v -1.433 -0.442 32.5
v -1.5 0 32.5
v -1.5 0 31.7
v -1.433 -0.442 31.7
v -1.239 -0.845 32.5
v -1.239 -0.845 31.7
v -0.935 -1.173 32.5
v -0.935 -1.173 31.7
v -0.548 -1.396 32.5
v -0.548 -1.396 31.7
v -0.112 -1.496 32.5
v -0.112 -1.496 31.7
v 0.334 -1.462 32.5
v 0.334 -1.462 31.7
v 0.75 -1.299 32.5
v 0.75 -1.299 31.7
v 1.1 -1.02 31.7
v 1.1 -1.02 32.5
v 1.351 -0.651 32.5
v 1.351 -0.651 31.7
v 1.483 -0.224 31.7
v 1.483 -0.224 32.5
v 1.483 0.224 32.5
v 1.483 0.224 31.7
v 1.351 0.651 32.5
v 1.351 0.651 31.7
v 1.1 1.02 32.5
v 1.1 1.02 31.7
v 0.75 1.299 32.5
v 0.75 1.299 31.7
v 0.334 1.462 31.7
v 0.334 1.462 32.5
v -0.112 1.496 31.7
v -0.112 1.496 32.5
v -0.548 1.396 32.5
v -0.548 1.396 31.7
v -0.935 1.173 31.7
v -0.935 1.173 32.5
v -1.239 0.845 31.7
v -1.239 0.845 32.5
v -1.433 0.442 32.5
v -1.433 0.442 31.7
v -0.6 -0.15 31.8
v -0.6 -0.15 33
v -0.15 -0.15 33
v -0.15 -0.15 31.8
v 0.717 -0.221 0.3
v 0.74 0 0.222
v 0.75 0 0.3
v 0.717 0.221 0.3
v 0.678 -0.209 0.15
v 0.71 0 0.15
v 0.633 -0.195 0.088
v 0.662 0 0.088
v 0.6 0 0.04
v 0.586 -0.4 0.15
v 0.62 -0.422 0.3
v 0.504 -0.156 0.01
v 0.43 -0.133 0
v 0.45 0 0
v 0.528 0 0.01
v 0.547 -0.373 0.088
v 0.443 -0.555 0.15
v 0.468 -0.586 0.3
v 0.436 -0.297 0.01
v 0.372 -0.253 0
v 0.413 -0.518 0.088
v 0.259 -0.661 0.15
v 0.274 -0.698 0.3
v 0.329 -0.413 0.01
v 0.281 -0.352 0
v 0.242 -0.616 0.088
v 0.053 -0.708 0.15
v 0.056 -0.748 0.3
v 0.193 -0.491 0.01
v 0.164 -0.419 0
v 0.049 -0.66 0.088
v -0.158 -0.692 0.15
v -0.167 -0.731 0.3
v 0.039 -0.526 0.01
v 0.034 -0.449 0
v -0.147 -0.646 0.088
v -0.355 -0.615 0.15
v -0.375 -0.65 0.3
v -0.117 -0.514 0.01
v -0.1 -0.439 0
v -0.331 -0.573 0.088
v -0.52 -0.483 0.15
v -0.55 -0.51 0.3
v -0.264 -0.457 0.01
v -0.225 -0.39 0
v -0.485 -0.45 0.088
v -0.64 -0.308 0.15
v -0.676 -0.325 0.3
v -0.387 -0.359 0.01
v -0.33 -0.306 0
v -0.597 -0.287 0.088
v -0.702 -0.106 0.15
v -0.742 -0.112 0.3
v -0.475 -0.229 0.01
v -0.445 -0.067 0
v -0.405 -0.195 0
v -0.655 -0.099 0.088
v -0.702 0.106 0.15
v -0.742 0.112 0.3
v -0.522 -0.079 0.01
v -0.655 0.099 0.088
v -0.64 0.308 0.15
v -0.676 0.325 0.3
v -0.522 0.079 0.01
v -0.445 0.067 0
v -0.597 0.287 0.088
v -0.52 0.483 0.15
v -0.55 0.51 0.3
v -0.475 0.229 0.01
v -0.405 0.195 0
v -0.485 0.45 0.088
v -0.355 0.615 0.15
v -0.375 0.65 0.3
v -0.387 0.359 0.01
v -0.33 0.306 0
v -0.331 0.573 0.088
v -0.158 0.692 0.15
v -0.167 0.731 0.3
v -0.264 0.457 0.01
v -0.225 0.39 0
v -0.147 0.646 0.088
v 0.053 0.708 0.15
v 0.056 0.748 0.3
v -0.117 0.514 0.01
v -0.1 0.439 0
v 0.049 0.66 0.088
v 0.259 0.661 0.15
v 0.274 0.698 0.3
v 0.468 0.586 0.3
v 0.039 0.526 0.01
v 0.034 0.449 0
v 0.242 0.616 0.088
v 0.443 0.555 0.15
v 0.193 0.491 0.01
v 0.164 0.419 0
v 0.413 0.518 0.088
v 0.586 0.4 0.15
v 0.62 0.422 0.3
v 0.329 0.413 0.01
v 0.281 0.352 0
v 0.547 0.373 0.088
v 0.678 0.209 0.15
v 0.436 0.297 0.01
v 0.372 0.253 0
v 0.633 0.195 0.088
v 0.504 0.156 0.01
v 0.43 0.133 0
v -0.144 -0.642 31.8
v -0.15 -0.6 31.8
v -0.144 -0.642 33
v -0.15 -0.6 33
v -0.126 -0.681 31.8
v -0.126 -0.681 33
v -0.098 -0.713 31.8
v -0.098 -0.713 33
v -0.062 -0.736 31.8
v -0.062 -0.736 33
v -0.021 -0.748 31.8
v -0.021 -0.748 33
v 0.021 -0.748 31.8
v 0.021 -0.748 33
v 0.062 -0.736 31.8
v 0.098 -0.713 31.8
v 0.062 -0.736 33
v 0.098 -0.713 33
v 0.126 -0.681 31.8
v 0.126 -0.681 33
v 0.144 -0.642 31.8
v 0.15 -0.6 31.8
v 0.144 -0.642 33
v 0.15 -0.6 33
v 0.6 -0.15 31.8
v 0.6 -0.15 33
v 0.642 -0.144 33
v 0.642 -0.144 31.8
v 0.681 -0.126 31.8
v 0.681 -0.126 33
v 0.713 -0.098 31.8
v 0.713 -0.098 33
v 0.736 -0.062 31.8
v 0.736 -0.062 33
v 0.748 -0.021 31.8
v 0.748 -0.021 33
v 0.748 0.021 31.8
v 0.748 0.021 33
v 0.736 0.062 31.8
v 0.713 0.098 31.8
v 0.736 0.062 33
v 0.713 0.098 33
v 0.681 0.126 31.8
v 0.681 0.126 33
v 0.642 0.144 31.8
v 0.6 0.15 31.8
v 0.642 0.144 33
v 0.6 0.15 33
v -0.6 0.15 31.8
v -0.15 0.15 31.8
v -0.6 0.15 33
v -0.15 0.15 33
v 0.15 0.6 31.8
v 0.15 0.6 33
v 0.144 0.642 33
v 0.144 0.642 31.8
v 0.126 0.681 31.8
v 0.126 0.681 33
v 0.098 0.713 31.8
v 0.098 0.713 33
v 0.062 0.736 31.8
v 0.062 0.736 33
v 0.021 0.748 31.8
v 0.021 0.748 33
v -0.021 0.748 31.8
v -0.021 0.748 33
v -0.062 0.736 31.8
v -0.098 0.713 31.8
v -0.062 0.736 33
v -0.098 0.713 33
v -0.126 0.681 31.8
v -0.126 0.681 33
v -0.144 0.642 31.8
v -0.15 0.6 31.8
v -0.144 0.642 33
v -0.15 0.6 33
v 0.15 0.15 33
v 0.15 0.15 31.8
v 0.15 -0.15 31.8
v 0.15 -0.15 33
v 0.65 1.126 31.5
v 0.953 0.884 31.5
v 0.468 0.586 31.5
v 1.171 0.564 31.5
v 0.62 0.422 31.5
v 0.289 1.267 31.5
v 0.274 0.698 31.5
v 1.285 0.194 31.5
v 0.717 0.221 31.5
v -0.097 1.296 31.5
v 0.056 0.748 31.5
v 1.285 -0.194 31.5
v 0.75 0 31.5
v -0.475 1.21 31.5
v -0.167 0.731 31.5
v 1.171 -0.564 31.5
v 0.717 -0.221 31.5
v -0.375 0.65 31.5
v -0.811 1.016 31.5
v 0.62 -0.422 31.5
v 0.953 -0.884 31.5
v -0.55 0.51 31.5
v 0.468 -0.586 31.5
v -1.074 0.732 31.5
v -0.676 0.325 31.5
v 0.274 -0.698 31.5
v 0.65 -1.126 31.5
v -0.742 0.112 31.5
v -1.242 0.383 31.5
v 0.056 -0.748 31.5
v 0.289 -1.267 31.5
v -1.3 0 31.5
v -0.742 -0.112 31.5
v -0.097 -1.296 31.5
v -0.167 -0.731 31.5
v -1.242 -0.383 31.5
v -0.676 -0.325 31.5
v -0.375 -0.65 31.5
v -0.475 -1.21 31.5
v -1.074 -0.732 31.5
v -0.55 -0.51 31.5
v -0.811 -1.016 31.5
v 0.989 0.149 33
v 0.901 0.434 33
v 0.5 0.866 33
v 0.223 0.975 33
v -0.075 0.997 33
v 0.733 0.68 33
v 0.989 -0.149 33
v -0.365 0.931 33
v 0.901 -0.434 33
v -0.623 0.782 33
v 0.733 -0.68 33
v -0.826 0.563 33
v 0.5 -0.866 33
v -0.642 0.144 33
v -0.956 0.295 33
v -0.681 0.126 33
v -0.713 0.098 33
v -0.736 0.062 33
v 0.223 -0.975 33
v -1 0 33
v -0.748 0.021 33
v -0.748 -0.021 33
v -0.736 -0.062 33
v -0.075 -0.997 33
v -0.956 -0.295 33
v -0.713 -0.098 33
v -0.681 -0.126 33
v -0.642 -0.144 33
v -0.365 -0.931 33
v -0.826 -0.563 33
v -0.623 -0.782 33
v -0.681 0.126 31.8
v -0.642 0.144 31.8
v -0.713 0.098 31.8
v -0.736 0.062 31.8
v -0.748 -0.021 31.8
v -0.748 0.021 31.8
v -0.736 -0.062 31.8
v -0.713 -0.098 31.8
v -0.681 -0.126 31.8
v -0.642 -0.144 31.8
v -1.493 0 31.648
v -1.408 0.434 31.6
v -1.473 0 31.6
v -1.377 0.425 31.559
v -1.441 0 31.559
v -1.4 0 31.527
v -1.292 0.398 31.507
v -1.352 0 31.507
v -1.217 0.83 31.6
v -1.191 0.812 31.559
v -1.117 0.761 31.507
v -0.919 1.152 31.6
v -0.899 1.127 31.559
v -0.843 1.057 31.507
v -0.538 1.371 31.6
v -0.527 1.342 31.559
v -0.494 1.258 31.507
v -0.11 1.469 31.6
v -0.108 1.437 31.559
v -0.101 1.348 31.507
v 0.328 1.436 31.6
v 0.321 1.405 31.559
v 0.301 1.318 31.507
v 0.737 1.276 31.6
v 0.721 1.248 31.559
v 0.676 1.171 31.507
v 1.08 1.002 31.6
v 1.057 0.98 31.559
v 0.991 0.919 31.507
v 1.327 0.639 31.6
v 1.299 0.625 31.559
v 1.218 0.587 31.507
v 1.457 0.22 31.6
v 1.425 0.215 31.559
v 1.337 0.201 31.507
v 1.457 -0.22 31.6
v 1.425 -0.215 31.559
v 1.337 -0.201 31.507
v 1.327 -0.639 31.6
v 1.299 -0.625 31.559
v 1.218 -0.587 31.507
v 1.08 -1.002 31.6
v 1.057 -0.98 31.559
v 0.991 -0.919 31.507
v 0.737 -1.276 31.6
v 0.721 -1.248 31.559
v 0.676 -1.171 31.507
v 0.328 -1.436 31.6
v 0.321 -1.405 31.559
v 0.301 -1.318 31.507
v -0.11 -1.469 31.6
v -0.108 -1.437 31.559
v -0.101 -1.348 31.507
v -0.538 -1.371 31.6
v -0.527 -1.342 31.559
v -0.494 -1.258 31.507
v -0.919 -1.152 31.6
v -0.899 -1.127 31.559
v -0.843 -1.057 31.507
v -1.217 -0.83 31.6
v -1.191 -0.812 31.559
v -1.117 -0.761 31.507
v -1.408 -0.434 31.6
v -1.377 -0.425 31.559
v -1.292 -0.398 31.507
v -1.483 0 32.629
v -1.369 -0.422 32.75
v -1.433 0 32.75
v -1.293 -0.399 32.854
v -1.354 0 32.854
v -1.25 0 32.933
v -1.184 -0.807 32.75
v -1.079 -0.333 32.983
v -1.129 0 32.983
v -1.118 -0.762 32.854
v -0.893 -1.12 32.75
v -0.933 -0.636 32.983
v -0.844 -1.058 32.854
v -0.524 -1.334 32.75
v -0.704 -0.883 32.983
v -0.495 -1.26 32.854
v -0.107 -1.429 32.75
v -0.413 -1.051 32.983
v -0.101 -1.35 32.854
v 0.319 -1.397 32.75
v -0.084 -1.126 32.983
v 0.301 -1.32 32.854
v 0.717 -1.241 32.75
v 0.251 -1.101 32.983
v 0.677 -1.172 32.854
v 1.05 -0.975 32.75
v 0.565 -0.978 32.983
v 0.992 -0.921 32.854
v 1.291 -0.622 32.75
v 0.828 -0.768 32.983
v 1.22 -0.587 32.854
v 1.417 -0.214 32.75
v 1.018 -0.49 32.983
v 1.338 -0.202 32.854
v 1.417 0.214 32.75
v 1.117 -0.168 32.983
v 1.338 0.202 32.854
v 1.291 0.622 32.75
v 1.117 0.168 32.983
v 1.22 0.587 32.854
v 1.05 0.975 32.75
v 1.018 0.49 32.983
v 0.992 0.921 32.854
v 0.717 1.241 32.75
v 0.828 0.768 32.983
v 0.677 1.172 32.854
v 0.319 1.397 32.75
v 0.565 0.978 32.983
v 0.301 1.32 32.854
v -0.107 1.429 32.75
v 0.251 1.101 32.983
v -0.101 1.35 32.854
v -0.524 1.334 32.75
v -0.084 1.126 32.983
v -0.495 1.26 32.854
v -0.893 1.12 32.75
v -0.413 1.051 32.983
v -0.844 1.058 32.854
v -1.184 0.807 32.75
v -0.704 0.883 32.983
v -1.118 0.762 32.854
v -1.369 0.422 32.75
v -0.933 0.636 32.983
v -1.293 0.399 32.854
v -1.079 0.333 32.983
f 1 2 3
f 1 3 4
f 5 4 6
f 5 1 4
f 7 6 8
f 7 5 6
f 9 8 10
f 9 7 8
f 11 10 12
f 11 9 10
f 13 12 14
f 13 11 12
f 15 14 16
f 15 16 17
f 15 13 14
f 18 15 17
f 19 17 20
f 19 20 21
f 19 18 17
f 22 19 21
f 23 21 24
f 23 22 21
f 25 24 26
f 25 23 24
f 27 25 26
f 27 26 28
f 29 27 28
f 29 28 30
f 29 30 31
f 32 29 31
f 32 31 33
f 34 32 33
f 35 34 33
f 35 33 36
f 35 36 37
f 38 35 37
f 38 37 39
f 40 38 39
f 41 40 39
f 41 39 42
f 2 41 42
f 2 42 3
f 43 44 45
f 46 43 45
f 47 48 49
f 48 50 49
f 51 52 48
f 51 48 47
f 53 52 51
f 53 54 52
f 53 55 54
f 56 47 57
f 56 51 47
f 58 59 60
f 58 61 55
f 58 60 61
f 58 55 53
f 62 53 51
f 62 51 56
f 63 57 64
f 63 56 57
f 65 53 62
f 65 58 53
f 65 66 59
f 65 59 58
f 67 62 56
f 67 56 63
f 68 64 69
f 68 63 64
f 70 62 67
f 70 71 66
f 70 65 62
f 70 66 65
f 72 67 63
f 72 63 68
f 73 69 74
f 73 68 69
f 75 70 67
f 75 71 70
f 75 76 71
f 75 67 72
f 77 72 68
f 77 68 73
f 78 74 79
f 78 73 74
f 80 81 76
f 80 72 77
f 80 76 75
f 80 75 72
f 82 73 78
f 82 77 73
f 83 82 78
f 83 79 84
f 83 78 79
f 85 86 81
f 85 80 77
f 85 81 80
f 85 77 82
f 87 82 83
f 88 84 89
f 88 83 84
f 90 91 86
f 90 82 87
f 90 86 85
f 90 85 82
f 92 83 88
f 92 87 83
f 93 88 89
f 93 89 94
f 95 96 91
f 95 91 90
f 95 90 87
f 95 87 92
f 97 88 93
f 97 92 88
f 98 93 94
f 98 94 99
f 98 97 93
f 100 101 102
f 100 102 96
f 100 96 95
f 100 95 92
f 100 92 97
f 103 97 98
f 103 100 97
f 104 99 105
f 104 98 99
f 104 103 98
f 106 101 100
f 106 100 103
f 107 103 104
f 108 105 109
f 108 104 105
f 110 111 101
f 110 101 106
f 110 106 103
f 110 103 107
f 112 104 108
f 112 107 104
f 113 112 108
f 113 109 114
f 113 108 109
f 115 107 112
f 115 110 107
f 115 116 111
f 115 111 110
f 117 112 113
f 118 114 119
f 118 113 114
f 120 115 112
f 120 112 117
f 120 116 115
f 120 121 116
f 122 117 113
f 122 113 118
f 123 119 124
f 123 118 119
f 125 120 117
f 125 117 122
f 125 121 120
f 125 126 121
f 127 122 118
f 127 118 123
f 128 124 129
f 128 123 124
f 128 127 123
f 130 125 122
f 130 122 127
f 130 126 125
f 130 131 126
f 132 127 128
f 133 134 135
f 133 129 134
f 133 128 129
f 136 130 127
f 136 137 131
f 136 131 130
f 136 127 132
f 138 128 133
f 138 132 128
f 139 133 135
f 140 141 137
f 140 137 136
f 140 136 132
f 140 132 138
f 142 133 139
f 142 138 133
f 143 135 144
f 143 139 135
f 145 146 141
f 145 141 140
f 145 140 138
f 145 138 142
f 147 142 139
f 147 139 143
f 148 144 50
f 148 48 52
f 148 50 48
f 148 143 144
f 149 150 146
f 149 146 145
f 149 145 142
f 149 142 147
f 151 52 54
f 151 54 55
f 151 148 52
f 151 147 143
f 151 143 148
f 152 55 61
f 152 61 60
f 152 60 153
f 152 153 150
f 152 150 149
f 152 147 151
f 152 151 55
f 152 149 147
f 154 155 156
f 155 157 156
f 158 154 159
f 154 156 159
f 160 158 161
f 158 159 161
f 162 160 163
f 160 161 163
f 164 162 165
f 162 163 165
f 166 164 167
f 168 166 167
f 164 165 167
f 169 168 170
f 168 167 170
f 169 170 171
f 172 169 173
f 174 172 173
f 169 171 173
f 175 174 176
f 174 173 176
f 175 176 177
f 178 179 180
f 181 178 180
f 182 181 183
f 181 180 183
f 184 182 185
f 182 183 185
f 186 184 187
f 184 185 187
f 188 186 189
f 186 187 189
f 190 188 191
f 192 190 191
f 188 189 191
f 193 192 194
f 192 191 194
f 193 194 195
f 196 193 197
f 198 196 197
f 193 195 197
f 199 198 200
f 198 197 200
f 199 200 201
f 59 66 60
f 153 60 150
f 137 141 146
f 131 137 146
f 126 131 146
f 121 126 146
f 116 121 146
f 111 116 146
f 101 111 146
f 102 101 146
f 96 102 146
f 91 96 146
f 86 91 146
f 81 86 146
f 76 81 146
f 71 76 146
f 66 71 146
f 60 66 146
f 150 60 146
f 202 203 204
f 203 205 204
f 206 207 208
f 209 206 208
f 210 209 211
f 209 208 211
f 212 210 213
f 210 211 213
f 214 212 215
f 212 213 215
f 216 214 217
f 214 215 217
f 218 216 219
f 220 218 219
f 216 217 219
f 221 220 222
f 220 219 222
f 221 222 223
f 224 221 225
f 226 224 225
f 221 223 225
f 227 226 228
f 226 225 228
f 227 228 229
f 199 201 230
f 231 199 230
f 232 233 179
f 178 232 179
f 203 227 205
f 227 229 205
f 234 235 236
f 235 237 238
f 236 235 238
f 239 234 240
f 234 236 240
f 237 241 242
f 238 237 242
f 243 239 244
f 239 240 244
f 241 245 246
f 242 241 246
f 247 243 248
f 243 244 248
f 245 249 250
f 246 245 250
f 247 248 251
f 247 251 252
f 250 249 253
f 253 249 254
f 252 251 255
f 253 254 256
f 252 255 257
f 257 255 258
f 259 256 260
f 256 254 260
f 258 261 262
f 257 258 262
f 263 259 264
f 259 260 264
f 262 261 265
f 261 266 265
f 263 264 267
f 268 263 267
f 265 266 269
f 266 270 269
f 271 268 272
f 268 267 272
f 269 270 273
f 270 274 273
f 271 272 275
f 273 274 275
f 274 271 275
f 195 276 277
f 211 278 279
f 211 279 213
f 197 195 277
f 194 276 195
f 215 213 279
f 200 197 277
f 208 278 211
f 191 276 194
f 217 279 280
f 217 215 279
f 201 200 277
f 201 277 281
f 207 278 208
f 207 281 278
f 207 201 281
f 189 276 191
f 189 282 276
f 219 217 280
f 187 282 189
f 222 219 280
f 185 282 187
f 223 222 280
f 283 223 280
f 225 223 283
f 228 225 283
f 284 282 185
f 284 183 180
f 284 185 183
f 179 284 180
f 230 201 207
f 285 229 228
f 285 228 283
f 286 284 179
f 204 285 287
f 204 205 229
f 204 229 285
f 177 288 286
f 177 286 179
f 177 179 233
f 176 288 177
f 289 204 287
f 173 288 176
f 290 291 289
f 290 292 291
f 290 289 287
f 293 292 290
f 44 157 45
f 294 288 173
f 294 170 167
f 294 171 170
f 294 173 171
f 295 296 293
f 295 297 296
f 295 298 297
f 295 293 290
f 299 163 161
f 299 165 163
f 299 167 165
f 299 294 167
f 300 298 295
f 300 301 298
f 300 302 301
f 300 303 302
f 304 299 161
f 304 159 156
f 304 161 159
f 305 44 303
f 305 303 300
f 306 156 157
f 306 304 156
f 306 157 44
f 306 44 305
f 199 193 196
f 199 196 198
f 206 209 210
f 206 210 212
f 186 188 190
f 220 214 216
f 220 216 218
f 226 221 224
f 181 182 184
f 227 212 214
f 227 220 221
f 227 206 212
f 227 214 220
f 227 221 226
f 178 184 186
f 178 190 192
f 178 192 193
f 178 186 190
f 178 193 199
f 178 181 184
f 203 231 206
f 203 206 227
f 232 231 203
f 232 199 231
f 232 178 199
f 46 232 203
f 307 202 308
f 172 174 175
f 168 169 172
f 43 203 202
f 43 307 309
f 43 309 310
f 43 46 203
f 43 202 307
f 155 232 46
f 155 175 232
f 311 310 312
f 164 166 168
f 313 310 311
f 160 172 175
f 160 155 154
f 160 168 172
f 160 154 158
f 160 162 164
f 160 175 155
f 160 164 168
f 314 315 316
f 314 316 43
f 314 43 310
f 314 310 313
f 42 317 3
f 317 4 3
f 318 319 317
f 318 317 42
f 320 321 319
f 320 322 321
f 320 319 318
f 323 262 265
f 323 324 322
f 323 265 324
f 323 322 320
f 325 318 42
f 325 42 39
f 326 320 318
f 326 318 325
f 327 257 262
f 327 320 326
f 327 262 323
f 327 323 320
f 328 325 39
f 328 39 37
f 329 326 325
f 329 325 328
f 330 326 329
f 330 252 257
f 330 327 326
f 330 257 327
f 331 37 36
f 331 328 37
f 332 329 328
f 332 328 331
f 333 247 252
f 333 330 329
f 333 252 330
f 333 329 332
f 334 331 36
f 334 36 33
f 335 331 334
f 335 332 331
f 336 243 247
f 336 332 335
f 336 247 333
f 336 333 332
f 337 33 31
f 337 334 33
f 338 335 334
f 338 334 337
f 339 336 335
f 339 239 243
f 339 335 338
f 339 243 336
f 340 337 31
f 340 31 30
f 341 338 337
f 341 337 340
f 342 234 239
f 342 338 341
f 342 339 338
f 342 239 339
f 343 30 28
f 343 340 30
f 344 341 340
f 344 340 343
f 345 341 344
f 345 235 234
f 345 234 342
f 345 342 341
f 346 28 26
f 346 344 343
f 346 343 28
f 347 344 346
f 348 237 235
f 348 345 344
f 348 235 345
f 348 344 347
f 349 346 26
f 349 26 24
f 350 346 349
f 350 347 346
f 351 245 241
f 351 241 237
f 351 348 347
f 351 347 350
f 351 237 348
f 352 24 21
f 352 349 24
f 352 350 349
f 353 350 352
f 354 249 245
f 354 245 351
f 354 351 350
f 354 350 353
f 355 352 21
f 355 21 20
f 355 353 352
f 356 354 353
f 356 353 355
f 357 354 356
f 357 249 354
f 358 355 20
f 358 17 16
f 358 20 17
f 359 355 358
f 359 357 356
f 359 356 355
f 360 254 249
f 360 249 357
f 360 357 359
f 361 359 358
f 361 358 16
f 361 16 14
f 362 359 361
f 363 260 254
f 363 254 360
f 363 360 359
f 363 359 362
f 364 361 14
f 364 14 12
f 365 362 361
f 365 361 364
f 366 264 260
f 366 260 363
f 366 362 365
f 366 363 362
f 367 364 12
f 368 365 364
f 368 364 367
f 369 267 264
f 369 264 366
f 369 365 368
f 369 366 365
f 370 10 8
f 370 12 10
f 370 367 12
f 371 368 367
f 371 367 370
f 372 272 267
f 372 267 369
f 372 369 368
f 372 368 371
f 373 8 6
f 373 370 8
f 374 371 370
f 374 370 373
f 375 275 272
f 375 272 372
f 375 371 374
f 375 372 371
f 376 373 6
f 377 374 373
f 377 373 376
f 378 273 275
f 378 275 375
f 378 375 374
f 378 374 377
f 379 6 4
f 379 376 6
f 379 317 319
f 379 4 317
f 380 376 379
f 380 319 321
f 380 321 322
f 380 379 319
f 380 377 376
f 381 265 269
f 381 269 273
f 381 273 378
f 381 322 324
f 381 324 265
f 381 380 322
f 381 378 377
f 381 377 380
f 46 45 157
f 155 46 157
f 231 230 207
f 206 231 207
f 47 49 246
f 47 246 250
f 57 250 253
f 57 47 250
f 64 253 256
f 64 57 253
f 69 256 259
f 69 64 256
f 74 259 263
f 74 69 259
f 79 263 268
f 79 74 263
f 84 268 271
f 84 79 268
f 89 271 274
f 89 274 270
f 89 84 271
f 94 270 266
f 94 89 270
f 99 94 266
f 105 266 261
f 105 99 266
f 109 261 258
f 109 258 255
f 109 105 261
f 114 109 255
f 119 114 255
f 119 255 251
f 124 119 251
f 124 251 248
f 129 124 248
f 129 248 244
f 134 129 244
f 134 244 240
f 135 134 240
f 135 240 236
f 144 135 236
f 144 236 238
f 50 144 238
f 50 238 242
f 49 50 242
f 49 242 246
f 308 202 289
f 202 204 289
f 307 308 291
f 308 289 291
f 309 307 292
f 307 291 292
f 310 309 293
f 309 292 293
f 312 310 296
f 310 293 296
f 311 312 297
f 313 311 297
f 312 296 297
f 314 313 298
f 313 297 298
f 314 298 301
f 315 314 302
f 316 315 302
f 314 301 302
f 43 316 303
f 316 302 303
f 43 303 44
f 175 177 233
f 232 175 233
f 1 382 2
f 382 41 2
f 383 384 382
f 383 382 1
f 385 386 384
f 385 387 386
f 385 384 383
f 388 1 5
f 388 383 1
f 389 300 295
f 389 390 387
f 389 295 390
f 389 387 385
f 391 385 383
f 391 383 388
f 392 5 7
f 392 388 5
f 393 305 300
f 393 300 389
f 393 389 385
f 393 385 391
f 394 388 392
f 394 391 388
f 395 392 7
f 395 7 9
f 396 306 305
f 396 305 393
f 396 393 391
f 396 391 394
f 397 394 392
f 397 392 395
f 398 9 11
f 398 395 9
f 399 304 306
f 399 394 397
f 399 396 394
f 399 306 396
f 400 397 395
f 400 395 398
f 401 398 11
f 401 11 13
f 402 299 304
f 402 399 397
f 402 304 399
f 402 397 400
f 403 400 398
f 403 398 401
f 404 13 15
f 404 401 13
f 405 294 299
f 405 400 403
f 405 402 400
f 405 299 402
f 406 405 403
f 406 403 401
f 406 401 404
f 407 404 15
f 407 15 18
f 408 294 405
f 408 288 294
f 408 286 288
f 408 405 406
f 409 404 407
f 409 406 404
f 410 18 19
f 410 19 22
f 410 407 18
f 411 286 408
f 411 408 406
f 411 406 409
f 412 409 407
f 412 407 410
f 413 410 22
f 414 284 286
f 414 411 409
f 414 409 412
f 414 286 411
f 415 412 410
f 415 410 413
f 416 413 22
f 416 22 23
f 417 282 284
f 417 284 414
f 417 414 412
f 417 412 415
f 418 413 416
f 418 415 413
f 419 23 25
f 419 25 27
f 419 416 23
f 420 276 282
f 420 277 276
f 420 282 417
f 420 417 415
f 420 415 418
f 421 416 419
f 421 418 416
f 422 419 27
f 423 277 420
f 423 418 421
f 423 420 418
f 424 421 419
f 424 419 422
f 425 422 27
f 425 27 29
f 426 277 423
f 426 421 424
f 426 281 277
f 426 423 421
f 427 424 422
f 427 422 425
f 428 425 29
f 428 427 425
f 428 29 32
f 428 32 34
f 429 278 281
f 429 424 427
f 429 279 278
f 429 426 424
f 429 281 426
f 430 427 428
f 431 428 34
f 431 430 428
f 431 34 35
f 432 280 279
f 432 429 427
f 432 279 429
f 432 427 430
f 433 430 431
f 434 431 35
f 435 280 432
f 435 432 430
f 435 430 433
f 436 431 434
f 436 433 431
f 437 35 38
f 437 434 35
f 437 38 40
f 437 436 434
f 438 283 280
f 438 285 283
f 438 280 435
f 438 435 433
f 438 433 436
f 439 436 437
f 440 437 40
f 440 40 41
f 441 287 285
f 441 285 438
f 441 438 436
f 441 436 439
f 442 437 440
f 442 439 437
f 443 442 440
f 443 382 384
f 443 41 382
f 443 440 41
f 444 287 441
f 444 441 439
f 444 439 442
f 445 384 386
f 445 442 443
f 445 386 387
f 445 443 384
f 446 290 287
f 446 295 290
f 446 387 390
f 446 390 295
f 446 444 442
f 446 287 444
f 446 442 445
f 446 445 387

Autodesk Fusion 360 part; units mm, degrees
sketch "Sketch1" plane through (0, 0, 0) normal (0, 0, 1) x (1, 0, 0)
  circle A0 centre (0, 0) radius 0.75
  dimension "d1" = 1.5
extrude "Extrude1" add sketch "Sketch1" along normal blind 33
sketch "Sketch2" plane through (0, 0, 33) normal (0, 0, 1) x (-1, 0, 0)
  circle A0 centre (0, 0) radius 0.75
  circle A1 centre (0, 0) radius 1.5
  dimension "d4" = 3
extrude "Extrude2" add sketch "Sketch2" against normal blind 1.5
fillet "Fillet1" radius 0.5 1 edges at (1.3985, 0.5424, 33)
fillet "Fillet2" radius 0.2 1 edges at (1.3985, -0.5424, 31.5)
sketch "Sketch3" plane through (0, 0, 33) normal (0, 0, 1) x (-1, 0, 0)
  circle A0 centre (0, 0) radius 1
  line L0 (0.6, 0.15) -> (-0.6, 0.15)
  arc A1 (-0.6, 0.15) -> (-0.6, -0.15) centre (-0.6, 0) ccw
  line L1 (-0.6, -0.15) -> (0.6, -0.15)
  arc A2 (0.6, -0.15) -> (0.6, 0.15) centre (0.6, 0) ccw
  line L2 (0.6, 0) -> (-0.6, 0) construction
  line L3 (-0.15, 0.6) -> (-0.15, -0.6)
  arc A3 (-0.15, -0.6) -> (0.15, -0.6) centre (0, -0.6) ccw
  line L4 (0.15, -0.6) -> (0.15, 0.6)
  arc A4 (0.15, 0.6) -> (-0.15, 0.6) centre (0, 0.6) ccw
  line L5 (0, 0.6) -> (0, -0.6) construction
  dimension "d11" = 0.3
  dimension "d12" = 1.2
  dimension "d13" = 0.3
  dimension "d14" = 1.2
extrude "Extrude3" cut sketch "Sketch3" against normal blind 1.2 contours L0 L1 A2 L4 | L0 L1 L3 L4 | L0 L3 L4 A4 | L0 A1 L1 L3 | L1 L3 A3 L4
fillet "Fillet3" radius 0.3 1 edges at (-0.6992, -0.2712, 0)
